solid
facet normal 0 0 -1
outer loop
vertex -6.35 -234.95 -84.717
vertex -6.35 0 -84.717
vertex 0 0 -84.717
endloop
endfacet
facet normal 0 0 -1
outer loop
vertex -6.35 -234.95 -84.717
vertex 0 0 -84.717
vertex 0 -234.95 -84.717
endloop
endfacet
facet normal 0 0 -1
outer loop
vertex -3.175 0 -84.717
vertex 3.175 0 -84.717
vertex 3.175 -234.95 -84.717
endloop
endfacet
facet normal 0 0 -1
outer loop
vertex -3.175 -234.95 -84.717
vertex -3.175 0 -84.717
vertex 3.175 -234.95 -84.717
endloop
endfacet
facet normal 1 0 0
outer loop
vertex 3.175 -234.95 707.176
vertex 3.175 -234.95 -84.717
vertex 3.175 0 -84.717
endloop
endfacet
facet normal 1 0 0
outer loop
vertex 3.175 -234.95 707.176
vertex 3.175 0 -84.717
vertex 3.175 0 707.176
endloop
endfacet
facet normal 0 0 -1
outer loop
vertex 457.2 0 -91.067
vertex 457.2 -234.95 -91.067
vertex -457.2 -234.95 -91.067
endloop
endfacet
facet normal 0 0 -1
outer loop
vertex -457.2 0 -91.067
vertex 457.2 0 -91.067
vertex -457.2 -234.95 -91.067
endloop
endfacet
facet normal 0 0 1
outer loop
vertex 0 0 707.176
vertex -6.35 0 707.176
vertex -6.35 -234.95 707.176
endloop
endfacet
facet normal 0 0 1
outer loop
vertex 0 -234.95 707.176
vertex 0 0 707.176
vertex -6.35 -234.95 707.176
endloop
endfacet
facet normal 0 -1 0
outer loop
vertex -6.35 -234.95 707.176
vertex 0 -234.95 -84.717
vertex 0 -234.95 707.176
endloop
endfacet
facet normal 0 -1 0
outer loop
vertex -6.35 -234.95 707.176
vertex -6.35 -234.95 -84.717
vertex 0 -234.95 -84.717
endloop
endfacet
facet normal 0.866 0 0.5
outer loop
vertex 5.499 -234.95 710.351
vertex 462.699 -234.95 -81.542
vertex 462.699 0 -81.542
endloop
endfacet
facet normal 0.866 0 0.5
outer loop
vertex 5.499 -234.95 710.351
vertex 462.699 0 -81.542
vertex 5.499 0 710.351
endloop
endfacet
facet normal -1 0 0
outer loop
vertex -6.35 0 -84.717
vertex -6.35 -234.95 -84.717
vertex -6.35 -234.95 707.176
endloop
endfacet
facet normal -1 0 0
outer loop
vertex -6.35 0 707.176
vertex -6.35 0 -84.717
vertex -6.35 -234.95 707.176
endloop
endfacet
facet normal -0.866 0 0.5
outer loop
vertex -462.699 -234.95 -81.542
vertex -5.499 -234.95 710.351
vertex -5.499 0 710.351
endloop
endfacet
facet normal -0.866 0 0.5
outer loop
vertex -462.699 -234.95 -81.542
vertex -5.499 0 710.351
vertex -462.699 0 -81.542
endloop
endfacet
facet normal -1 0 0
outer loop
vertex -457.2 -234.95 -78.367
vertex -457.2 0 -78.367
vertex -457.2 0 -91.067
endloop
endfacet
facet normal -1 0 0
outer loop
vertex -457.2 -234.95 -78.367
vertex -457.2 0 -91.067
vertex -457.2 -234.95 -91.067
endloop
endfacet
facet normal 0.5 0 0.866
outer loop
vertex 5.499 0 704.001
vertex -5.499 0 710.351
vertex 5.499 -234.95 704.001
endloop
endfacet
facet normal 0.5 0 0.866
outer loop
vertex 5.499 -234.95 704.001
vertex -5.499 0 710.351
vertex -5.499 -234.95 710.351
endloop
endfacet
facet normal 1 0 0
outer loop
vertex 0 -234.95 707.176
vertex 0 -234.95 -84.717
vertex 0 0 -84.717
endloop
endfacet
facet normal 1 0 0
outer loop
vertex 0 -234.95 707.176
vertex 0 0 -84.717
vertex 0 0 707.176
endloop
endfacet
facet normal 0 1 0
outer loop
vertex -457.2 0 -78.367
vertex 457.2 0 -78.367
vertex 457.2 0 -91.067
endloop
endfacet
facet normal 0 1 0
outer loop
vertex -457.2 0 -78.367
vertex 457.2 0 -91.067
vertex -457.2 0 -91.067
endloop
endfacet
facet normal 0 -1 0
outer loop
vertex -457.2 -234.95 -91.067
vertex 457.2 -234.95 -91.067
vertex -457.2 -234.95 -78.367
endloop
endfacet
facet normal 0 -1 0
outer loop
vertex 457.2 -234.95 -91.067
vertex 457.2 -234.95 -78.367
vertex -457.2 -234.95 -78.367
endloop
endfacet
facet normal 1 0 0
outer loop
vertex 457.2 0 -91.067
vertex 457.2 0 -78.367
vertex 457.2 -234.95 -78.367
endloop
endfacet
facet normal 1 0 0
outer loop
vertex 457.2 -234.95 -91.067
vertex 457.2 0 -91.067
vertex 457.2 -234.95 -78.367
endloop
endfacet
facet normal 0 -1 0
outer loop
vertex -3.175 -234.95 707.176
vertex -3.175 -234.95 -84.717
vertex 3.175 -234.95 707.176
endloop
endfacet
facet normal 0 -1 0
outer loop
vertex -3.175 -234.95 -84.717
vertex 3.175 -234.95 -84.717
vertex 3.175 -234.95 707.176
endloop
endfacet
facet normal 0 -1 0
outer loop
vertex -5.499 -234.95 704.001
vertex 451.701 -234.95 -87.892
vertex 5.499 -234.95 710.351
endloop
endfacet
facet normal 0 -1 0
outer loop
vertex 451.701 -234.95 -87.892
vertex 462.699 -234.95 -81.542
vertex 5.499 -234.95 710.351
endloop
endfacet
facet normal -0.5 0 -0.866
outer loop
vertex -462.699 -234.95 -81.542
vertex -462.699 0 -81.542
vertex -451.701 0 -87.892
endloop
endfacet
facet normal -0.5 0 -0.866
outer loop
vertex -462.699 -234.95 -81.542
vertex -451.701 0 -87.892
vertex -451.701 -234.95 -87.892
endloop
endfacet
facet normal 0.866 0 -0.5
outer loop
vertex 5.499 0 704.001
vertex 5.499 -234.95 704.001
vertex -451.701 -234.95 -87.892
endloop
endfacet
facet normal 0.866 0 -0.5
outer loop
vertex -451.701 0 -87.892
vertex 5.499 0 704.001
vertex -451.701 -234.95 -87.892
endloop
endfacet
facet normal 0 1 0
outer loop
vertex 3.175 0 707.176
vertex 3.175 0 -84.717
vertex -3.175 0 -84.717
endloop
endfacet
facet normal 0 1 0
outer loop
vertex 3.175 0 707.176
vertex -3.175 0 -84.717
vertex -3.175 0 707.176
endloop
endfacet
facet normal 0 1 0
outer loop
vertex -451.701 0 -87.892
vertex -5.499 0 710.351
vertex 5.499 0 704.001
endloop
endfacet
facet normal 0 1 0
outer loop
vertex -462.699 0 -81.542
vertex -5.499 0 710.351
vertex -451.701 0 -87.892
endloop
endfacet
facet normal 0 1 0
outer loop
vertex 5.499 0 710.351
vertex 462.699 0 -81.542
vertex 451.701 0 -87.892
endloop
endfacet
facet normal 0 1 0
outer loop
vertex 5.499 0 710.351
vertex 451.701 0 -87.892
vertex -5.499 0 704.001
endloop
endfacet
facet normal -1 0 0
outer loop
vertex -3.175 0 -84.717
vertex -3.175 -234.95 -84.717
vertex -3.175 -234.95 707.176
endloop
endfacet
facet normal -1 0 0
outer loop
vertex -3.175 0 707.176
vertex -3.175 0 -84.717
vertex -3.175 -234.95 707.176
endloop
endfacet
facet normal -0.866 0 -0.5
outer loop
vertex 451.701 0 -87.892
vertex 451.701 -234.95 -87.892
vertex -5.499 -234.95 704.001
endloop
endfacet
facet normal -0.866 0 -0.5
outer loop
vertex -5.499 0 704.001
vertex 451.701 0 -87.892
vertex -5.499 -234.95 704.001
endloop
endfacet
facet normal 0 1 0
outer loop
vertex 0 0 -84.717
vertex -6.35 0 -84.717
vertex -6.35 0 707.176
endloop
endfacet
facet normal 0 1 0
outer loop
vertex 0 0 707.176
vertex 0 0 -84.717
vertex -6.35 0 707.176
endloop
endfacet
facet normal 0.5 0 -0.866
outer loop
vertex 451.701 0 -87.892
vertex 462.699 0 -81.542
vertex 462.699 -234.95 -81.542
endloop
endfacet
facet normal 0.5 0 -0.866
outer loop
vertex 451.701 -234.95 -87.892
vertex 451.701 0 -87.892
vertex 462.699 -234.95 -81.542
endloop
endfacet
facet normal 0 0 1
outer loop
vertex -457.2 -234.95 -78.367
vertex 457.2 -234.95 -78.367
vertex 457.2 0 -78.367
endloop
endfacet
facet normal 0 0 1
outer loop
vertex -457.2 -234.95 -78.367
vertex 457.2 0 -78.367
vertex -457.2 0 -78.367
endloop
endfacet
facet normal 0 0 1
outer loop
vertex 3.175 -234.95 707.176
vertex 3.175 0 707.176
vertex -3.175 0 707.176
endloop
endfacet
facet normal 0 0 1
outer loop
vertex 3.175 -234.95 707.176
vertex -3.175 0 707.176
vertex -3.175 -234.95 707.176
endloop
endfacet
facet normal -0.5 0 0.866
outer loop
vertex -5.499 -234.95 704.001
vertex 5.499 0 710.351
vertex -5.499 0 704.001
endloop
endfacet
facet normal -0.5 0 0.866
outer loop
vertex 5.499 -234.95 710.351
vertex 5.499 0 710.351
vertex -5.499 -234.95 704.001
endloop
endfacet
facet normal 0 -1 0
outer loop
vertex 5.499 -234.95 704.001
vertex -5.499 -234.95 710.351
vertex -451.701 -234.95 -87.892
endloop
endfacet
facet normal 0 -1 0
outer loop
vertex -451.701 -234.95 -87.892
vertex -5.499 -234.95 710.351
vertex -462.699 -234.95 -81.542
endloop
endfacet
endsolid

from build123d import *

# Parameters (mm, degrees)
F2_E1_W  = 791.8936292205
F2_E1_H  = 234.95
F3_DEPTH = 3.175
F1_E0_W  = 914.4
F1_E0_H  = 234.95
F5_DEPTH = 6.35
F1_E3_W  = 914.4
F1_E3_H  = 234.95
F6_DEPTH = 6.35
F1_E2_W  = 914.4
F1_E2_H  = 234.95
F7_DEPTH = 6.35


# Not quite as in the source:
# - a feature of the source that left no trace in its solid (it failed there, or was rolled back) is left out
# - a pattern or mirror of a feature is missing from the dataset's text; its kind, count and spacing are read off the source's solid
# - the program builds the solid bodies; features that only make, move or delete a surface that nothing else refers to are left out


with BuildPart() as f3:
    # F2_E1 (on explicit) → F3 (new body, symmetric)
    with BuildSketch(Plane(origin=(0, 0, -84.7172419105), x_dir=(0, 0, 1), z_dir=(1, 0, 0))):
        with Locations((395.9468146102, 117.475)):
            Rectangle(F2_E1_W, F2_E1_H)
    extrude(amount=F3_DEPTH, both=True)


with BuildPart() as f3_copies_1:
    # F3_copies: instance of F3
    add(f3.part.mirror(Plane(origin=(-1.5875, 0, 0), x_dir=(0, 0, -1), z_dir=(-1, 0, 0))))


with BuildPart() as f5:
    # F1_E0 (on explicit) → F5 (new body, symmetric)
    with BuildSketch(Plane(origin=(457.2, 0, -84.7172419105), x_dir=(-1, 0, 0), z_dir=(0, 0, 1))):
        with Locations((457.2, 117.475)):
            Rectangle(F1_E0_W, F1_E0_H)
    extrude(amount=F5_DEPTH, both=True)


with BuildPart() as f6:
    # F1_E3 (on explicit) → F6 (new body, symmetric)
    with BuildSketch(Plane(origin=(457.2, 0, -84.7172419105), x_dir=(-0.5, 0, 0.8660254038), z_dir=(0.8660254038, 0, 0.5))):
        with Locations((457.2, 117.475)):
            Rectangle(F1_E3_W, F1_E3_H)
    extrude(amount=F6_DEPTH, both=True)


with BuildPart() as f7:
    # F1_E2 (on explicit) → F7 (new body, symmetric)
    with BuildSketch(Plane(origin=(0, 0, 707.17638731), x_dir=(-0.5, 0, -0.8660254038), z_dir=(-0.8660254038, 0, 0.5))):
        with Locations((457.2, 117.475)):
            Rectangle(F1_E2_W, F1_E2_H)
    extrude(amount=F7_DEPTH, both=True)


solid = Compound([f3.part, f3_copies_1.part, f5.part, f6.part, f7.part])
